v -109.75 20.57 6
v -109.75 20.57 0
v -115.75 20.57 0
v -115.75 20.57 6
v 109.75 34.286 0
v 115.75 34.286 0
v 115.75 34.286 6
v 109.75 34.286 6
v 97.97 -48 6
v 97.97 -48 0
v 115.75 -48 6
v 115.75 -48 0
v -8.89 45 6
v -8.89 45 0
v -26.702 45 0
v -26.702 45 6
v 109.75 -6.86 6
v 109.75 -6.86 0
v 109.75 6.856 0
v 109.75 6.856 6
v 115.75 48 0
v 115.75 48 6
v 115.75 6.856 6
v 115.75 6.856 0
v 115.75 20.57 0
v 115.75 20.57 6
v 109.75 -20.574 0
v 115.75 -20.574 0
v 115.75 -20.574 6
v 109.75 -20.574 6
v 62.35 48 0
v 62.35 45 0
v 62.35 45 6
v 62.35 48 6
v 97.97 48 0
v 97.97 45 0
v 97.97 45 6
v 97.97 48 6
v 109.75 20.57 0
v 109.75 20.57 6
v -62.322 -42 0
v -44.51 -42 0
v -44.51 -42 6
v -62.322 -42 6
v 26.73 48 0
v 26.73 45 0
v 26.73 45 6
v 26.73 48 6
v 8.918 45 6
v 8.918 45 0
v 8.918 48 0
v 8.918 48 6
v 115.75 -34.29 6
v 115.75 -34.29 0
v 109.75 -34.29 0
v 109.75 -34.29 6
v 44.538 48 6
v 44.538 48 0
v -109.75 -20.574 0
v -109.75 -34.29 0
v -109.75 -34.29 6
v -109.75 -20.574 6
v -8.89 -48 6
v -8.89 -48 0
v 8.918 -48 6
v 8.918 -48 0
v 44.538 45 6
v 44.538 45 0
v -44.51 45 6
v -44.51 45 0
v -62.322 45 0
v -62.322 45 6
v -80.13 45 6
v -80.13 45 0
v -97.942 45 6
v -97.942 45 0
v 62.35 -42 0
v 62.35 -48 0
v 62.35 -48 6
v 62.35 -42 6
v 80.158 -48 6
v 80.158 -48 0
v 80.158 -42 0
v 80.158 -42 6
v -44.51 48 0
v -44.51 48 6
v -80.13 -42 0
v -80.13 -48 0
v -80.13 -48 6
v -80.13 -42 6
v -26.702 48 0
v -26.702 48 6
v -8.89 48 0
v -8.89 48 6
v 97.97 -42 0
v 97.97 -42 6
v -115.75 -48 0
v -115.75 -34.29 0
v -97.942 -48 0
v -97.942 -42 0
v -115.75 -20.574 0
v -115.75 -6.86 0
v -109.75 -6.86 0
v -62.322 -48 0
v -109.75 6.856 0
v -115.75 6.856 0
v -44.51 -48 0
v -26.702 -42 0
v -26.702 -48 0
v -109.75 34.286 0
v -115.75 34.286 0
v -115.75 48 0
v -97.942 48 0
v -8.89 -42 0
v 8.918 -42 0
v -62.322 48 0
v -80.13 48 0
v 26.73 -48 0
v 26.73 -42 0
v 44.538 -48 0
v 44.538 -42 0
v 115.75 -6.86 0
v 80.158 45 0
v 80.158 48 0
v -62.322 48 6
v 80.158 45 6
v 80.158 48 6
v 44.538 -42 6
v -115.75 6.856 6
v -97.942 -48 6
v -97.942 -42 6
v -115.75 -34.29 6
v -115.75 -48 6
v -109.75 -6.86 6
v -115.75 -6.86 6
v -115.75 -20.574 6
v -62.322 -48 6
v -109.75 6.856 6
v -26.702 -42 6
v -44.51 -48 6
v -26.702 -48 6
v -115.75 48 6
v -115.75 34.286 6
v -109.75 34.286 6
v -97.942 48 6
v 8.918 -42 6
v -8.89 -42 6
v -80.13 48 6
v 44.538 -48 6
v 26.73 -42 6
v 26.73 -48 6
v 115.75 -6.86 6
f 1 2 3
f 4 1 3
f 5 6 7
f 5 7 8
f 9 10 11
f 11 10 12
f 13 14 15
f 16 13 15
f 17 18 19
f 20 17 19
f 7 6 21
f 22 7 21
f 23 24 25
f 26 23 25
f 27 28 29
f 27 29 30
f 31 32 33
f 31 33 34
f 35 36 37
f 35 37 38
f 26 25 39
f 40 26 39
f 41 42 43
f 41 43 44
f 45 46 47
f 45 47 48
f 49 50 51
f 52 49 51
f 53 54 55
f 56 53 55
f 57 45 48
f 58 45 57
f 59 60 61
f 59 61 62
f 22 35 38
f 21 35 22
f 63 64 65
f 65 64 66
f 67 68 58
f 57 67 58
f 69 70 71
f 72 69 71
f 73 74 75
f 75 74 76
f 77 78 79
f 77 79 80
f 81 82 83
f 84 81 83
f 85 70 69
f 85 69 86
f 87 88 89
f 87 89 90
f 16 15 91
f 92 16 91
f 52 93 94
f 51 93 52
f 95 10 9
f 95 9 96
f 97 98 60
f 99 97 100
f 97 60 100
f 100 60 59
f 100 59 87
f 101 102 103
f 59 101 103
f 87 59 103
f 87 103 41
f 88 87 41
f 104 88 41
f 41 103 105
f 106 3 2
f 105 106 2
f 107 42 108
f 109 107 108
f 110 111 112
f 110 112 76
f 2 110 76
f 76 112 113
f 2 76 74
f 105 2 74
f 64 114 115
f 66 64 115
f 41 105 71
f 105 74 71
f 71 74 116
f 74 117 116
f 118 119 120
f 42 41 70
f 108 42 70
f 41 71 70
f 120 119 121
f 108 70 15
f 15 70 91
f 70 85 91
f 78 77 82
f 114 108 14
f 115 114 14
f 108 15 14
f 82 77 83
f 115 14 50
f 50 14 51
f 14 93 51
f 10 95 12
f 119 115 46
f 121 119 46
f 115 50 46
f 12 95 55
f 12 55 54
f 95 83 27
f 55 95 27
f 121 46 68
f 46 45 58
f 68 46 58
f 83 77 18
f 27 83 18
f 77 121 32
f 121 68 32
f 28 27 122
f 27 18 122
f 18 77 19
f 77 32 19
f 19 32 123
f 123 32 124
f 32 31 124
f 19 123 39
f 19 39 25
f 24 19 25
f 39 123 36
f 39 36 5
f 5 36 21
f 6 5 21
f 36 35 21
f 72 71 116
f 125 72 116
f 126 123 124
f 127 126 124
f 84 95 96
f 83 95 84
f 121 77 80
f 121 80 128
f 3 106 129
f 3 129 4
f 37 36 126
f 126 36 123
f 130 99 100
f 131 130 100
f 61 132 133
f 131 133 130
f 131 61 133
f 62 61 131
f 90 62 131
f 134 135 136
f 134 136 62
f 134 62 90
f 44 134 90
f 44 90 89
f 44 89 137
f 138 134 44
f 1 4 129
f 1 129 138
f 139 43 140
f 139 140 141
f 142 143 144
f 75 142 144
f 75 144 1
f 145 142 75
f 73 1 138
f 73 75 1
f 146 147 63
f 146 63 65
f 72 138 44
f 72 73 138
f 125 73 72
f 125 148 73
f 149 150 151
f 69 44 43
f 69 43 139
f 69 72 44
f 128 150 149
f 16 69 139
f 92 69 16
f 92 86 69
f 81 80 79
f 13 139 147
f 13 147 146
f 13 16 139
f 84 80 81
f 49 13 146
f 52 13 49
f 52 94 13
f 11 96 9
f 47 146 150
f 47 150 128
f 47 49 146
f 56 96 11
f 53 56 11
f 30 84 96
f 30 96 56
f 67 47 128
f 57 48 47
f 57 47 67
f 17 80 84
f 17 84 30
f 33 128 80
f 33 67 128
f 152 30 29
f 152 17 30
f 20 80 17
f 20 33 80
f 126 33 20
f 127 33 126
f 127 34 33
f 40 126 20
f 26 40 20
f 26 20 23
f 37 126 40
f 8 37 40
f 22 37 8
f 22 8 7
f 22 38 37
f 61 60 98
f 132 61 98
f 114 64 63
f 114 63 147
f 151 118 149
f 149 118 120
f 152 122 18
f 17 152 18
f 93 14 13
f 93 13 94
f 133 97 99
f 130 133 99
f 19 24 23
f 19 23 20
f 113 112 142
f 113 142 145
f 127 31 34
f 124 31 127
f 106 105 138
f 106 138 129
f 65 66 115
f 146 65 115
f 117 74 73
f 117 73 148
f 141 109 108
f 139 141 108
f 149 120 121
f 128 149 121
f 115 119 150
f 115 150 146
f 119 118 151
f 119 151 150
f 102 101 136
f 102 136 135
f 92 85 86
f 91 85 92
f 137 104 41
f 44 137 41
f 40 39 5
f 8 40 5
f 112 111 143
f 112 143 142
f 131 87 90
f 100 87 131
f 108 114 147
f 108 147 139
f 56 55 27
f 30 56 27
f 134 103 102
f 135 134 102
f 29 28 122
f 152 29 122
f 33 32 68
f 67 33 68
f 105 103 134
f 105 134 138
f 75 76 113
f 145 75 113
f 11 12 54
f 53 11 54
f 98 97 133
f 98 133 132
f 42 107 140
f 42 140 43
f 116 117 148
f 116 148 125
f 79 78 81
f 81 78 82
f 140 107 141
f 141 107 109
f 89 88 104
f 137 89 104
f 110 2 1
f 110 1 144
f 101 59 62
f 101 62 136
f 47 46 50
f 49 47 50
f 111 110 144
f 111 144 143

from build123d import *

# Parameters (mm, degrees)
ESBO_O1_W                = 231.5
ESBO_O1_H                = 96
RESSALTO_EXTRUS_O1_DEPTH = 6
CORTE_EXTRUS_O1_REACH    = 127.451
ESBO_O2_W                = 17.812307692
ESBO_O2_H                = 6
CORTE_EXTRUS_O3_REACH    = 127.451
ESBO_O4_W                = 6
ESBO_O4_H                = 13.715714286


with BuildPart() as part:
    # Esboço1 → Ressalto-extrusão1 (new body)
    with BuildSketch(Plane.XY):
        Rectangle(ESBO_O1_W, ESBO_O1_H)
    extrude(amount=RESSALTO_EXTRUS_O1_DEPTH)

    # Esboço2 → Corte-extrusão1 (cut, up to next)
    with BuildSketch(Plane(origin=(0, 0, 0), x_dir=(-1, 0, 0), z_dir=(0, 0, -1)), mode=Mode.PRIVATE) as corte_extrus_o1_sk1:
        with Locations((17.796153846, -45)):
            Rectangle(ESBO_O2_W, ESBO_O2_H)
    corte_extrus_o1_tool1 = extrude(corte_extrus_o1_sk1.sketch, amount=-CORTE_EXTRUS_O1_REACH, mode=Mode.PRIVATE) & part.part
    # Esboço2 → Corte-extrusão1 (cut, up to next)
    with BuildSketch(Plane(origin=(0, 0, 0), x_dir=(-1, 0, 0), z_dir=(0, 0, -1)), mode=Mode.PRIVATE) as corte_extrus_o1_sk2:
        with Locations((53.416153846, -45)):
            Rectangle(ESBO_O2_W, ESBO_O2_H)
    corte_extrus_o1_tool2 = extrude(corte_extrus_o1_sk2.sketch, amount=-CORTE_EXTRUS_O1_REACH, mode=Mode.PRIVATE) & part.part
    # Esboço2 → Corte-extrusão1 (cut, up to next)
    with BuildSketch(Plane(origin=(0, 0, 0), x_dir=(-1, 0, 0), z_dir=(0, 0, -1)), mode=Mode.PRIVATE) as corte_extrus_o1_sk3:
        with Locations((89.036153846, -45)):
            Rectangle(ESBO_O2_W, ESBO_O2_H)
    corte_extrus_o1_tool3 = extrude(corte_extrus_o1_sk3.sketch, amount=-CORTE_EXTRUS_O1_REACH, mode=Mode.PRIVATE) & part.part
    # Esboço2 → Corte-extrusão1 (cut, up to next)
    with BuildSketch(Plane(origin=(0, 0, 0), x_dir=(-1, 0, 0), z_dir=(0, 0, -1)), mode=Mode.PRIVATE) as corte_extrus_o1_sk4:
        with Locations((-17.823846154, -45)):
            Rectangle(ESBO_O2_W, ESBO_O2_H)
    corte_extrus_o1_tool4 = extrude(corte_extrus_o1_sk4.sketch, amount=-CORTE_EXTRUS_O1_REACH, mode=Mode.PRIVATE) & part.part
    # Esboço2 → Corte-extrusão1 (cut, up to next)
    with BuildSketch(Plane(origin=(0, 0, 0), x_dir=(-1, 0, 0), z_dir=(0, 0, -1)), mode=Mode.PRIVATE) as corte_extrus_o1_sk5:
        with Locations((-53.443846154, -45)):
            Rectangle(ESBO_O2_W, ESBO_O2_H)
    corte_extrus_o1_tool5 = extrude(corte_extrus_o1_sk5.sketch, amount=-CORTE_EXTRUS_O1_REACH, mode=Mode.PRIVATE) & part.part
    # Esboço2 → Corte-extrusão1 (cut, up to next)
    with BuildSketch(Plane(origin=(0, 0, 0), x_dir=(-1, 0, 0), z_dir=(0, 0, -1)), mode=Mode.PRIVATE) as corte_extrus_o1_sk6:
        with Locations((-89.063846154, -45)):
            Rectangle(ESBO_O2_W, ESBO_O2_H)
    corte_extrus_o1_tool6 = extrude(corte_extrus_o1_sk6.sketch, amount=-CORTE_EXTRUS_O1_REACH, mode=Mode.PRIVATE) & part.part
    # Esboço2 → Corte-extrusão1 (cut, up to next)
    with BuildSketch(Plane(origin=(0, 0, 0), x_dir=(-1, 0, 0), z_dir=(0, 0, -1)), mode=Mode.PRIVATE) as corte_extrus_o1_sk7:
        with Locations((-89.063846154, 48)):
            Rectangle(ESBO_O2_W, ESBO_O2_H)
    corte_extrus_o1_tool7 = extrude(corte_extrus_o1_sk7.sketch, amount=-CORTE_EXTRUS_O1_REACH, mode=Mode.PRIVATE) & part.part
    # Esboço2 → Corte-extrusão1 (cut, up to next)
    with BuildSketch(Plane(origin=(0, 0, 0), x_dir=(-1, 0, 0), z_dir=(0, 0, -1)), mode=Mode.PRIVATE) as corte_extrus_o1_sk8:
        with Locations((-53.443846154, 48)):
            Rectangle(ESBO_O2_W, ESBO_O2_H)
    corte_extrus_o1_tool8 = extrude(corte_extrus_o1_sk8.sketch, amount=-CORTE_EXTRUS_O1_REACH, mode=Mode.PRIVATE) & part.part
    # Esboço2 → Corte-extrusão1 (cut, up to next)
    with BuildSketch(Plane(origin=(0, 0, 0), x_dir=(-1, 0, 0), z_dir=(0, 0, -1)), mode=Mode.PRIVATE) as corte_extrus_o1_sk9:
        with Locations((-17.823846154, 48)):
            Rectangle(ESBO_O2_W, ESBO_O2_H)
    corte_extrus_o1_tool9 = extrude(corte_extrus_o1_sk9.sketch, amount=-CORTE_EXTRUS_O1_REACH, mode=Mode.PRIVATE) & part.part
    # Esboço2 → Corte-extrusão1 (cut, up to next)
    with BuildSketch(Plane(origin=(0, 0, 0), x_dir=(-1, 0, 0), z_dir=(0, 0, -1)), mode=Mode.PRIVATE) as corte_extrus_o1_sk10:
        with Locations((17.796153846, 48)):
            Rectangle(ESBO_O2_W, ESBO_O2_H)
    corte_extrus_o1_tool10 = extrude(corte_extrus_o1_sk10.sketch, amount=-CORTE_EXTRUS_O1_REACH, mode=Mode.PRIVATE) & part.part
    # Esboço2 → Corte-extrusão1 (cut, up to next)
    with BuildSketch(Plane(origin=(0, 0, 0), x_dir=(-1, 0, 0), z_dir=(0, 0, -1)), mode=Mode.PRIVATE) as corte_extrus_o1_sk11:
        with Locations((89.036153846, 48)):
            Rectangle(ESBO_O2_W, ESBO_O2_H)
    corte_extrus_o1_tool11 = extrude(corte_extrus_o1_sk11.sketch, amount=-CORTE_EXTRUS_O1_REACH, mode=Mode.PRIVATE) & part.part
    # Esboço2 → Corte-extrusão1 (cut, up to next)
    with BuildSketch(Plane(origin=(0, 0, 0), x_dir=(-1, 0, 0), z_dir=(0, 0, -1)), mode=Mode.PRIVATE) as corte_extrus_o1_sk12:
        with Locations((53.416153846, 48)):
            Rectangle(ESBO_O2_W, ESBO_O2_H)
    corte_extrus_o1_tool12 = extrude(corte_extrus_o1_sk12.sketch, amount=-CORTE_EXTRUS_O1_REACH, mode=Mode.PRIVATE) & part.part
    add(corte_extrus_o1_tool1.solids().sort_by_distance((-17.796154, -45, 0))[0], mode=Mode.SUBTRACT)
    add(corte_extrus_o1_tool2.solids().sort_by_distance((-53.416154, -45, 0))[0], mode=Mode.SUBTRACT)
    add(corte_extrus_o1_tool3.solids().sort_by_distance((-89.036154, -45, 0))[0], mode=Mode.SUBTRACT)
    add(corte_extrus_o1_tool4.solids().sort_by_distance((17.823846, -45, 0))[0], mode=Mode.SUBTRACT)
    add(corte_extrus_o1_tool5.solids().sort_by_distance((53.443846, -45, 0))[0], mode=Mode.SUBTRACT)
    add(corte_extrus_o1_tool6.solids().sort_by_distance((89.063846, -45, 0))[0], mode=Mode.SUBTRACT)
    add(corte_extrus_o1_tool7.solids().sort_by_distance((89.063846, 48, 0))[0], mode=Mode.SUBTRACT)
    add(corte_extrus_o1_tool8.solids().sort_by_distance((53.443846, 48, 0))[0], mode=Mode.SUBTRACT)
    add(corte_extrus_o1_tool9.solids().sort_by_distance((17.823846, 48, 0))[0], mode=Mode.SUBTRACT)
    add(corte_extrus_o1_tool10.solids().sort_by_distance((-17.796154, 48, 0))[0], mode=Mode.SUBTRACT)
    add(corte_extrus_o1_tool11.solids().sort_by_distance((-89.036154, 48, 0))[0], mode=Mode.SUBTRACT)
    add(corte_extrus_o1_tool12.solids().sort_by_distance((-53.416154, 48, 0))[0], mode=Mode.SUBTRACT)

    # Esboço4 → Corte-extrusão3 (cut, up to next)
    with BuildSketch(Plane(origin=(0, 0, 0), x_dir=(-1, 0, 0), z_dir=(0, 0, -1)), mode=Mode.PRIVATE) as corte_extrus_o3_sk1:
        with Locations((112.75, -0.002142857)):
            Rectangle(ESBO_O4_W, ESBO_O4_H)
    corte_extrus_o3_tool1 = extrude(corte_extrus_o3_sk1.sketch, amount=-CORTE_EXTRUS_O3_REACH, mode=Mode.PRIVATE) & part.part
    # Esboço4 → Corte-extrusão3 (cut, up to next)
    with BuildSketch(Plane(origin=(0, 0, 0), x_dir=(-1, 0, 0), z_dir=(0, 0, -1)), mode=Mode.PRIVATE) as corte_extrus_o3_sk2:
        with Locations((112.75, 27.427857143)):
            Rectangle(ESBO_O4_W, ESBO_O4_H)
    corte_extrus_o3_tool2 = extrude(corte_extrus_o3_sk2.sketch, amount=-CORTE_EXTRUS_O3_REACH, mode=Mode.PRIVATE) & part.part
    # Esboço4 → Corte-extrusão3 (cut, up to next)
    with BuildSketch(Plane(origin=(0, 0, 0), x_dir=(-1, 0, 0), z_dir=(0, 0, -1)), mode=Mode.PRIVATE) as corte_extrus_o3_sk3:
        with Locations((-112.75, 27.427857143)):
            Rectangle(ESBO_O4_W, ESBO_O4_H)
    corte_extrus_o3_tool3 = extrude(corte_extrus_o3_sk3.sketch, amount=-CORTE_EXTRUS_O3_REACH, mode=Mode.PRIVATE) & part.part
    # Esboço4 → Corte-extrusão3 (cut, up to next)
    with BuildSketch(Plane(origin=(0, 0, 0), x_dir=(-1, 0, 0), z_dir=(0, 0, -1)), mode=Mode.PRIVATE) as corte_extrus_o3_sk4:
        with Locations((-112.75, -0.002142857)):
            Rectangle(ESBO_O4_W, ESBO_O4_H)
    corte_extrus_o3_tool4 = extrude(corte_extrus_o3_sk4.sketch, amount=-CORTE_EXTRUS_O3_REACH, mode=Mode.PRIVATE) & part.part
    # Esboço4 → Corte-extrusão3 (cut, up to next)
    with BuildSketch(Plane(origin=(0, 0, 0), x_dir=(-1, 0, 0), z_dir=(0, 0, -1)), mode=Mode.PRIVATE) as corte_extrus_o3_sk5:
        with Locations((-112.75, -27.432142857)):
            Rectangle(ESBO_O4_W, ESBO_O4_H)
    corte_extrus_o3_tool5 = extrude(corte_extrus_o3_sk5.sketch, amount=-CORTE_EXTRUS_O3_REACH, mode=Mode.PRIVATE) & part.part
    # Esboço4 → Corte-extrusão3 (cut, up to next)
    with BuildSketch(Plane(origin=(0, 0, 0), x_dir=(-1, 0, 0), z_dir=(0, 0, -1)), mode=Mode.PRIVATE) as corte_extrus_o3_sk6:
        with Locations((112.75, -27.432142857)):
            Rectangle(ESBO_O4_W, ESBO_O4_H)
    corte_extrus_o3_tool6 = extrude(corte_extrus_o3_sk6.sketch, amount=-CORTE_EXTRUS_O3_REACH, mode=Mode.PRIVATE) & part.part
    add(corte_extrus_o3_tool1.solids().sort_by_distance((-112.75, -0.002143, 0))[0], mode=Mode.SUBTRACT)
    add(corte_extrus_o3_tool2.solids().sort_by_distance((-112.75, 27.427857, 0))[0], mode=Mode.SUBTRACT)
    add(corte_extrus_o3_tool3.solids().sort_by_distance((112.75, 27.427857, 0))[0], mode=Mode.SUBTRACT)
    add(corte_extrus_o3_tool4.solids().sort_by_distance((112.75, -0.002143, 0))[0], mode=Mode.SUBTRACT)
    add(corte_extrus_o3_tool5.solids().sort_by_distance((112.75, -27.432143, 0))[0], mode=Mode.SUBTRACT)
    add(corte_extrus_o3_tool6.solids().sort_by_distance((-112.75, -27.432143, 0))[0], mode=Mode.SUBTRACT)


solid = part.part
